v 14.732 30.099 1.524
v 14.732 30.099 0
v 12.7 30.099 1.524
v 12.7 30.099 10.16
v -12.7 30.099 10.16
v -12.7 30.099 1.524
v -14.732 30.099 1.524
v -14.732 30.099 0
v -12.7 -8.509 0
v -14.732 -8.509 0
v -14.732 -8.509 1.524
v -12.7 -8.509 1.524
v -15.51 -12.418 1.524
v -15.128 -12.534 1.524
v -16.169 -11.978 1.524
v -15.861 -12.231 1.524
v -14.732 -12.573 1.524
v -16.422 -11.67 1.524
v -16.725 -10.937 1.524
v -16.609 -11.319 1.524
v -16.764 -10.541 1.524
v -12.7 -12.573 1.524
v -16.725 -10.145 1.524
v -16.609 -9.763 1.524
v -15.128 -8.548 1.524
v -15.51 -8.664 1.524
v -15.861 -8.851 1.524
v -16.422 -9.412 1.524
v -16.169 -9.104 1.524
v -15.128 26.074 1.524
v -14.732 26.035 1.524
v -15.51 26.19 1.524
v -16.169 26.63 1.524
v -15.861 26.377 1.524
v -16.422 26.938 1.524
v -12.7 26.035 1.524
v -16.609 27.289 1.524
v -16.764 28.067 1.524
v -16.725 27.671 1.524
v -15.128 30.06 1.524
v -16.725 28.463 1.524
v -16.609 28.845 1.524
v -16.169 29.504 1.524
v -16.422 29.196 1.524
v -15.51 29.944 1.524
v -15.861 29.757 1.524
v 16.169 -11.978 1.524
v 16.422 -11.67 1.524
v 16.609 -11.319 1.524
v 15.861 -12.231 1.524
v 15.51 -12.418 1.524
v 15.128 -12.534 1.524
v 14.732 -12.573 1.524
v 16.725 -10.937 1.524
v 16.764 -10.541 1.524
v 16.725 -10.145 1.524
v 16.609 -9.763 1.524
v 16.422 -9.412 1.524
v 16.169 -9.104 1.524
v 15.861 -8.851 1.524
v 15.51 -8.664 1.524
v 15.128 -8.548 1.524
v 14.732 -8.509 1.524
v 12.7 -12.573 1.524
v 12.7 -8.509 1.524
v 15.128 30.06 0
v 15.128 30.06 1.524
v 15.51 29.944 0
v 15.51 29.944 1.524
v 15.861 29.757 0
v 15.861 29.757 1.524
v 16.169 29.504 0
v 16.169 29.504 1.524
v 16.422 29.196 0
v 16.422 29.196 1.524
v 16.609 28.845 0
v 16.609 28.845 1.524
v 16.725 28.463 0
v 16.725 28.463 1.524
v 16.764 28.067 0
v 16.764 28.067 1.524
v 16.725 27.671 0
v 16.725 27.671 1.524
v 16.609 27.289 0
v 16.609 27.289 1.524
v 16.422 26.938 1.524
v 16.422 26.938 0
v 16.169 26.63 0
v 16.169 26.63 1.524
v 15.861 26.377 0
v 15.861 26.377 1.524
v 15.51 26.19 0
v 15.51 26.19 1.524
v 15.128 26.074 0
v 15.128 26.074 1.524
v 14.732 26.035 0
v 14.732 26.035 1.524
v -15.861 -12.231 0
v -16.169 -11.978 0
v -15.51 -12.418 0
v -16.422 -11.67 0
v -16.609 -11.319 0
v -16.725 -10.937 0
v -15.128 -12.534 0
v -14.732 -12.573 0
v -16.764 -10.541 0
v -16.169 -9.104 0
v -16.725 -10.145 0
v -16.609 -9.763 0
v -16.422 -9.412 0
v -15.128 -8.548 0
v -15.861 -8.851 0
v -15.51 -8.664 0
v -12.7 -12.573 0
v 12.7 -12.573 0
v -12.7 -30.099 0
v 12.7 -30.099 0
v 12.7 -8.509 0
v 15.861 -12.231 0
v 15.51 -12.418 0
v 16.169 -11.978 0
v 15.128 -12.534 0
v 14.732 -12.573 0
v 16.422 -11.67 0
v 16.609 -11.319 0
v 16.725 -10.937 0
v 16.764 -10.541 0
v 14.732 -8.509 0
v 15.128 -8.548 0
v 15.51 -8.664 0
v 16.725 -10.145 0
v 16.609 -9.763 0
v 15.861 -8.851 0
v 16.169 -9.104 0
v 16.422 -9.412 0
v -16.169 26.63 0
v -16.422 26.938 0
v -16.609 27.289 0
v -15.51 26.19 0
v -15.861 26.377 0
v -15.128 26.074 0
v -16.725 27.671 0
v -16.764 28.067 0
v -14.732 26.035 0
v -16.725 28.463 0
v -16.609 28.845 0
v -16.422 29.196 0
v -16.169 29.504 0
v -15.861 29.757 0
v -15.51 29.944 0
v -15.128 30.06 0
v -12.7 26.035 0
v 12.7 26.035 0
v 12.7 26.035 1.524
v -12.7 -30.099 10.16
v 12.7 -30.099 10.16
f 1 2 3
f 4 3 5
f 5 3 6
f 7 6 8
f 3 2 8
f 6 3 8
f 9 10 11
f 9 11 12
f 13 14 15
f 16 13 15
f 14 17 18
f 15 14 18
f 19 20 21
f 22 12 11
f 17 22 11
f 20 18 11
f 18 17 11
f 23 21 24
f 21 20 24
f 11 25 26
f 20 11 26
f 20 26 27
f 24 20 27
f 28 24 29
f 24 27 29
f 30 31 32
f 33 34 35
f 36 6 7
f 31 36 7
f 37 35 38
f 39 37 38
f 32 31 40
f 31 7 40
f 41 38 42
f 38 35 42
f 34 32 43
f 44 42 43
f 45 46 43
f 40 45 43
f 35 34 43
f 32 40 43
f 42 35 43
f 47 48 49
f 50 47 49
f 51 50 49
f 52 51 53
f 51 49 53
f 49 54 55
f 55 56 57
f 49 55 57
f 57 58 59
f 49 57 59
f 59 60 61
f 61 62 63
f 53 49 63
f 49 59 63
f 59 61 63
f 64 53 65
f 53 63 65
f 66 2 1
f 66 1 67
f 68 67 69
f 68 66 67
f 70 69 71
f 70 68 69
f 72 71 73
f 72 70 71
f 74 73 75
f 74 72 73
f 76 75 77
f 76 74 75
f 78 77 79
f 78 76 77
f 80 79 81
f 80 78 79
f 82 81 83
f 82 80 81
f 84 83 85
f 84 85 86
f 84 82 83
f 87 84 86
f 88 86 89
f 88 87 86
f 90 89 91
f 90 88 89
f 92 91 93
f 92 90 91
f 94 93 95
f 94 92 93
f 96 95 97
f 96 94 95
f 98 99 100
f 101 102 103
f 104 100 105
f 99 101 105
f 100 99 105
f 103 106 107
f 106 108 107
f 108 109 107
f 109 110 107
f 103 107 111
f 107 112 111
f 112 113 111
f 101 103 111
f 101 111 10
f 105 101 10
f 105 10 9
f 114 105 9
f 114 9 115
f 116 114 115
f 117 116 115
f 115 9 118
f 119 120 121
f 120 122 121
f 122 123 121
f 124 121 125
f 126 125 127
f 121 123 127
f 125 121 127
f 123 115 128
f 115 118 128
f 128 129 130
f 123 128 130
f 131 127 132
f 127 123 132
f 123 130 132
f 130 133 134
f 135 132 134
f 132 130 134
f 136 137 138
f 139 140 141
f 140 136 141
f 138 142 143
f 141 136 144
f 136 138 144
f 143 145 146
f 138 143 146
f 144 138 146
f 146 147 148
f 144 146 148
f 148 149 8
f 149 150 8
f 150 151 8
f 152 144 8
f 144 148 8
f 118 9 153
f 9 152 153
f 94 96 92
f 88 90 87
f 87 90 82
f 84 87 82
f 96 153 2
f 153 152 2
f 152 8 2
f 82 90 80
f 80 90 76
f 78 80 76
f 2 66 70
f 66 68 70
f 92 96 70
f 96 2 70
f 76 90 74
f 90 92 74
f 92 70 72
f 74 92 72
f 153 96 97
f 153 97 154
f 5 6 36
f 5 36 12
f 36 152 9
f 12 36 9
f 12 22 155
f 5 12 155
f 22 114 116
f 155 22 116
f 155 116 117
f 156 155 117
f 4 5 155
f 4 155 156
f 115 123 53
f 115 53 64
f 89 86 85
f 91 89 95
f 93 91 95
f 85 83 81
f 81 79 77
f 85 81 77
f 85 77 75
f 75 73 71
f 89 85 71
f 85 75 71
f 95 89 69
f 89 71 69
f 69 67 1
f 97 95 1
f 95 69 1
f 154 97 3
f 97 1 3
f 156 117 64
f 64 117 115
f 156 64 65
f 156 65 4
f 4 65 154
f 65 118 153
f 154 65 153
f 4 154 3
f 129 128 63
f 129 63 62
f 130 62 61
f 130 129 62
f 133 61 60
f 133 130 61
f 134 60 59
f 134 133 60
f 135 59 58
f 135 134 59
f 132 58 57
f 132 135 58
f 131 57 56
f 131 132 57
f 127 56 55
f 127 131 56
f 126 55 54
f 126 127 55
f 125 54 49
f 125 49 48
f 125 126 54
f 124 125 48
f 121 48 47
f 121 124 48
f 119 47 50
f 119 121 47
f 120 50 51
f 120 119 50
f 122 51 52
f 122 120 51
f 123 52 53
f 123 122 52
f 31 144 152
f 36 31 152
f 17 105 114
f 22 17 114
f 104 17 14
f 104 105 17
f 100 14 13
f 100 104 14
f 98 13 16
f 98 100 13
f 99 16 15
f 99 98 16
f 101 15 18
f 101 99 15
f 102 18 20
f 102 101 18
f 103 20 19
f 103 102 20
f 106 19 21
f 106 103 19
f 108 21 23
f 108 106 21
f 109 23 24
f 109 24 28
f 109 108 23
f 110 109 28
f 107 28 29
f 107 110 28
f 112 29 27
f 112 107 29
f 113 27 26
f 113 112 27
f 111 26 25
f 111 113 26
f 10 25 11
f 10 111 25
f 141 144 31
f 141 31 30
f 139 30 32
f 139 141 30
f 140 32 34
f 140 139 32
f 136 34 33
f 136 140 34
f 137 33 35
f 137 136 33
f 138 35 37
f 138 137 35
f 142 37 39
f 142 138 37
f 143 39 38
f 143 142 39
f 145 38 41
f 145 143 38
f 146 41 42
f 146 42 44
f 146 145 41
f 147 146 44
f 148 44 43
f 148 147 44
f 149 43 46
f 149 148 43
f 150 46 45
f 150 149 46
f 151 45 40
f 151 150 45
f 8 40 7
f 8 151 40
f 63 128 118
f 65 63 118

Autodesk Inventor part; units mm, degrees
ref_plane "YZ Plane" through (0, 0, 0) normal (1, 0, 0) x (0, 1, 0)
ref_plane "XZ Plane" through (0, 0, 0) normal (0, 1, 0) x (-1, 0, 0)
ref_plane "XY Plane" through (0, 0, 0) normal (0, 0, 1) x (1, 0, 0)
sketch "Sketch1" plane through (0, 0, 0) normal (0, 0, 1) x (1, 0, 0)
  line L0 (12.7, 30.099) -> (-12.7, 30.099)
  line L1 (-12.7, 30.099) -> (-12.7, -30.099)
  line L2 (-12.7, -30.099) -> (12.7, -30.099)
  line L3 (12.7, -30.099) -> (12.7, 30.099)
  point P0 (0, 0)
  point P1 (0, 30.099)
  point P2 (-12.7, 0)
  dimension "d0" = 60.198
  dimension "d1" = 25.4
extrude "Extrusion1" add sketch "Sketch1" along normal blind 10.16
sketch "Sketch2" plane through (0, 0, 0) normal (0, 0, -1) x (-1, 0, 0)
  line L0 (-12.7, 30.099) -> (12.7, 30.099) projected
  line L1 (-12.7, -30.099) -> (-12.7, 30.099) projected
  line L2 (12.7, -30.099) -> (-12.7, -30.099) projected
  arc A0 (-14.732, 30.099) -> (-14.732, 26.035) centre (-14.732, 28.067) ccw
  line L3 (-14.732, 30.099) -> (-12.7, 30.099)
  line L4 (-14.732, 26.035) -> (-12.7, 26.035)
  line L5 (0, 30.099) -> (0, -30.099)
  arc A1 (-14.732, -8.509) -> (-14.732, -12.573) centre (-14.732, -10.541) ccw
  line L6 (-14.732, -8.509) -> (-12.7, -8.509)
  line L7 (-14.732, -12.573) -> (-12.7, -12.573)
  line L8 (-12.7, 30.099) -> (-12.7, 26.035)
  line L9 (-12.7, -8.509) -> (-12.7, -12.573)
  arc A2 (14.732, 26.035) -> (14.732, 30.099) centre (14.732, 28.067) ccw
  line L10 (14.732, 30.099) -> (12.7, 30.099)
  line L11 (14.732, 26.035) -> (12.7, 26.035)
  arc A3 (14.732, -12.573) -> (14.732, -8.509) centre (14.732, -10.541) ccw
  line L12 (14.732, -8.509) -> (12.7, -8.509)
  line L13 (14.732, -12.573) -> (12.7, -12.573)
  line L14 (12.7, 30.099) -> (12.7, 26.035)
  line L15 (12.7, -8.509) -> (12.7, -12.573)
  point P0 (0, 0)
  dimension "d4" = 2.032
  dimension "d5" = 2.032
  dimension "d6" = 42.672
extrude "Extrusion2" add sketch "Sketch2" against normal blind 1.524 contours L10 A2 L11 L14 | L1 L4 A0 L3 | L1 L7 A1 L6 | L13 L15 L12 A3
properties part number "Lisa-M"
